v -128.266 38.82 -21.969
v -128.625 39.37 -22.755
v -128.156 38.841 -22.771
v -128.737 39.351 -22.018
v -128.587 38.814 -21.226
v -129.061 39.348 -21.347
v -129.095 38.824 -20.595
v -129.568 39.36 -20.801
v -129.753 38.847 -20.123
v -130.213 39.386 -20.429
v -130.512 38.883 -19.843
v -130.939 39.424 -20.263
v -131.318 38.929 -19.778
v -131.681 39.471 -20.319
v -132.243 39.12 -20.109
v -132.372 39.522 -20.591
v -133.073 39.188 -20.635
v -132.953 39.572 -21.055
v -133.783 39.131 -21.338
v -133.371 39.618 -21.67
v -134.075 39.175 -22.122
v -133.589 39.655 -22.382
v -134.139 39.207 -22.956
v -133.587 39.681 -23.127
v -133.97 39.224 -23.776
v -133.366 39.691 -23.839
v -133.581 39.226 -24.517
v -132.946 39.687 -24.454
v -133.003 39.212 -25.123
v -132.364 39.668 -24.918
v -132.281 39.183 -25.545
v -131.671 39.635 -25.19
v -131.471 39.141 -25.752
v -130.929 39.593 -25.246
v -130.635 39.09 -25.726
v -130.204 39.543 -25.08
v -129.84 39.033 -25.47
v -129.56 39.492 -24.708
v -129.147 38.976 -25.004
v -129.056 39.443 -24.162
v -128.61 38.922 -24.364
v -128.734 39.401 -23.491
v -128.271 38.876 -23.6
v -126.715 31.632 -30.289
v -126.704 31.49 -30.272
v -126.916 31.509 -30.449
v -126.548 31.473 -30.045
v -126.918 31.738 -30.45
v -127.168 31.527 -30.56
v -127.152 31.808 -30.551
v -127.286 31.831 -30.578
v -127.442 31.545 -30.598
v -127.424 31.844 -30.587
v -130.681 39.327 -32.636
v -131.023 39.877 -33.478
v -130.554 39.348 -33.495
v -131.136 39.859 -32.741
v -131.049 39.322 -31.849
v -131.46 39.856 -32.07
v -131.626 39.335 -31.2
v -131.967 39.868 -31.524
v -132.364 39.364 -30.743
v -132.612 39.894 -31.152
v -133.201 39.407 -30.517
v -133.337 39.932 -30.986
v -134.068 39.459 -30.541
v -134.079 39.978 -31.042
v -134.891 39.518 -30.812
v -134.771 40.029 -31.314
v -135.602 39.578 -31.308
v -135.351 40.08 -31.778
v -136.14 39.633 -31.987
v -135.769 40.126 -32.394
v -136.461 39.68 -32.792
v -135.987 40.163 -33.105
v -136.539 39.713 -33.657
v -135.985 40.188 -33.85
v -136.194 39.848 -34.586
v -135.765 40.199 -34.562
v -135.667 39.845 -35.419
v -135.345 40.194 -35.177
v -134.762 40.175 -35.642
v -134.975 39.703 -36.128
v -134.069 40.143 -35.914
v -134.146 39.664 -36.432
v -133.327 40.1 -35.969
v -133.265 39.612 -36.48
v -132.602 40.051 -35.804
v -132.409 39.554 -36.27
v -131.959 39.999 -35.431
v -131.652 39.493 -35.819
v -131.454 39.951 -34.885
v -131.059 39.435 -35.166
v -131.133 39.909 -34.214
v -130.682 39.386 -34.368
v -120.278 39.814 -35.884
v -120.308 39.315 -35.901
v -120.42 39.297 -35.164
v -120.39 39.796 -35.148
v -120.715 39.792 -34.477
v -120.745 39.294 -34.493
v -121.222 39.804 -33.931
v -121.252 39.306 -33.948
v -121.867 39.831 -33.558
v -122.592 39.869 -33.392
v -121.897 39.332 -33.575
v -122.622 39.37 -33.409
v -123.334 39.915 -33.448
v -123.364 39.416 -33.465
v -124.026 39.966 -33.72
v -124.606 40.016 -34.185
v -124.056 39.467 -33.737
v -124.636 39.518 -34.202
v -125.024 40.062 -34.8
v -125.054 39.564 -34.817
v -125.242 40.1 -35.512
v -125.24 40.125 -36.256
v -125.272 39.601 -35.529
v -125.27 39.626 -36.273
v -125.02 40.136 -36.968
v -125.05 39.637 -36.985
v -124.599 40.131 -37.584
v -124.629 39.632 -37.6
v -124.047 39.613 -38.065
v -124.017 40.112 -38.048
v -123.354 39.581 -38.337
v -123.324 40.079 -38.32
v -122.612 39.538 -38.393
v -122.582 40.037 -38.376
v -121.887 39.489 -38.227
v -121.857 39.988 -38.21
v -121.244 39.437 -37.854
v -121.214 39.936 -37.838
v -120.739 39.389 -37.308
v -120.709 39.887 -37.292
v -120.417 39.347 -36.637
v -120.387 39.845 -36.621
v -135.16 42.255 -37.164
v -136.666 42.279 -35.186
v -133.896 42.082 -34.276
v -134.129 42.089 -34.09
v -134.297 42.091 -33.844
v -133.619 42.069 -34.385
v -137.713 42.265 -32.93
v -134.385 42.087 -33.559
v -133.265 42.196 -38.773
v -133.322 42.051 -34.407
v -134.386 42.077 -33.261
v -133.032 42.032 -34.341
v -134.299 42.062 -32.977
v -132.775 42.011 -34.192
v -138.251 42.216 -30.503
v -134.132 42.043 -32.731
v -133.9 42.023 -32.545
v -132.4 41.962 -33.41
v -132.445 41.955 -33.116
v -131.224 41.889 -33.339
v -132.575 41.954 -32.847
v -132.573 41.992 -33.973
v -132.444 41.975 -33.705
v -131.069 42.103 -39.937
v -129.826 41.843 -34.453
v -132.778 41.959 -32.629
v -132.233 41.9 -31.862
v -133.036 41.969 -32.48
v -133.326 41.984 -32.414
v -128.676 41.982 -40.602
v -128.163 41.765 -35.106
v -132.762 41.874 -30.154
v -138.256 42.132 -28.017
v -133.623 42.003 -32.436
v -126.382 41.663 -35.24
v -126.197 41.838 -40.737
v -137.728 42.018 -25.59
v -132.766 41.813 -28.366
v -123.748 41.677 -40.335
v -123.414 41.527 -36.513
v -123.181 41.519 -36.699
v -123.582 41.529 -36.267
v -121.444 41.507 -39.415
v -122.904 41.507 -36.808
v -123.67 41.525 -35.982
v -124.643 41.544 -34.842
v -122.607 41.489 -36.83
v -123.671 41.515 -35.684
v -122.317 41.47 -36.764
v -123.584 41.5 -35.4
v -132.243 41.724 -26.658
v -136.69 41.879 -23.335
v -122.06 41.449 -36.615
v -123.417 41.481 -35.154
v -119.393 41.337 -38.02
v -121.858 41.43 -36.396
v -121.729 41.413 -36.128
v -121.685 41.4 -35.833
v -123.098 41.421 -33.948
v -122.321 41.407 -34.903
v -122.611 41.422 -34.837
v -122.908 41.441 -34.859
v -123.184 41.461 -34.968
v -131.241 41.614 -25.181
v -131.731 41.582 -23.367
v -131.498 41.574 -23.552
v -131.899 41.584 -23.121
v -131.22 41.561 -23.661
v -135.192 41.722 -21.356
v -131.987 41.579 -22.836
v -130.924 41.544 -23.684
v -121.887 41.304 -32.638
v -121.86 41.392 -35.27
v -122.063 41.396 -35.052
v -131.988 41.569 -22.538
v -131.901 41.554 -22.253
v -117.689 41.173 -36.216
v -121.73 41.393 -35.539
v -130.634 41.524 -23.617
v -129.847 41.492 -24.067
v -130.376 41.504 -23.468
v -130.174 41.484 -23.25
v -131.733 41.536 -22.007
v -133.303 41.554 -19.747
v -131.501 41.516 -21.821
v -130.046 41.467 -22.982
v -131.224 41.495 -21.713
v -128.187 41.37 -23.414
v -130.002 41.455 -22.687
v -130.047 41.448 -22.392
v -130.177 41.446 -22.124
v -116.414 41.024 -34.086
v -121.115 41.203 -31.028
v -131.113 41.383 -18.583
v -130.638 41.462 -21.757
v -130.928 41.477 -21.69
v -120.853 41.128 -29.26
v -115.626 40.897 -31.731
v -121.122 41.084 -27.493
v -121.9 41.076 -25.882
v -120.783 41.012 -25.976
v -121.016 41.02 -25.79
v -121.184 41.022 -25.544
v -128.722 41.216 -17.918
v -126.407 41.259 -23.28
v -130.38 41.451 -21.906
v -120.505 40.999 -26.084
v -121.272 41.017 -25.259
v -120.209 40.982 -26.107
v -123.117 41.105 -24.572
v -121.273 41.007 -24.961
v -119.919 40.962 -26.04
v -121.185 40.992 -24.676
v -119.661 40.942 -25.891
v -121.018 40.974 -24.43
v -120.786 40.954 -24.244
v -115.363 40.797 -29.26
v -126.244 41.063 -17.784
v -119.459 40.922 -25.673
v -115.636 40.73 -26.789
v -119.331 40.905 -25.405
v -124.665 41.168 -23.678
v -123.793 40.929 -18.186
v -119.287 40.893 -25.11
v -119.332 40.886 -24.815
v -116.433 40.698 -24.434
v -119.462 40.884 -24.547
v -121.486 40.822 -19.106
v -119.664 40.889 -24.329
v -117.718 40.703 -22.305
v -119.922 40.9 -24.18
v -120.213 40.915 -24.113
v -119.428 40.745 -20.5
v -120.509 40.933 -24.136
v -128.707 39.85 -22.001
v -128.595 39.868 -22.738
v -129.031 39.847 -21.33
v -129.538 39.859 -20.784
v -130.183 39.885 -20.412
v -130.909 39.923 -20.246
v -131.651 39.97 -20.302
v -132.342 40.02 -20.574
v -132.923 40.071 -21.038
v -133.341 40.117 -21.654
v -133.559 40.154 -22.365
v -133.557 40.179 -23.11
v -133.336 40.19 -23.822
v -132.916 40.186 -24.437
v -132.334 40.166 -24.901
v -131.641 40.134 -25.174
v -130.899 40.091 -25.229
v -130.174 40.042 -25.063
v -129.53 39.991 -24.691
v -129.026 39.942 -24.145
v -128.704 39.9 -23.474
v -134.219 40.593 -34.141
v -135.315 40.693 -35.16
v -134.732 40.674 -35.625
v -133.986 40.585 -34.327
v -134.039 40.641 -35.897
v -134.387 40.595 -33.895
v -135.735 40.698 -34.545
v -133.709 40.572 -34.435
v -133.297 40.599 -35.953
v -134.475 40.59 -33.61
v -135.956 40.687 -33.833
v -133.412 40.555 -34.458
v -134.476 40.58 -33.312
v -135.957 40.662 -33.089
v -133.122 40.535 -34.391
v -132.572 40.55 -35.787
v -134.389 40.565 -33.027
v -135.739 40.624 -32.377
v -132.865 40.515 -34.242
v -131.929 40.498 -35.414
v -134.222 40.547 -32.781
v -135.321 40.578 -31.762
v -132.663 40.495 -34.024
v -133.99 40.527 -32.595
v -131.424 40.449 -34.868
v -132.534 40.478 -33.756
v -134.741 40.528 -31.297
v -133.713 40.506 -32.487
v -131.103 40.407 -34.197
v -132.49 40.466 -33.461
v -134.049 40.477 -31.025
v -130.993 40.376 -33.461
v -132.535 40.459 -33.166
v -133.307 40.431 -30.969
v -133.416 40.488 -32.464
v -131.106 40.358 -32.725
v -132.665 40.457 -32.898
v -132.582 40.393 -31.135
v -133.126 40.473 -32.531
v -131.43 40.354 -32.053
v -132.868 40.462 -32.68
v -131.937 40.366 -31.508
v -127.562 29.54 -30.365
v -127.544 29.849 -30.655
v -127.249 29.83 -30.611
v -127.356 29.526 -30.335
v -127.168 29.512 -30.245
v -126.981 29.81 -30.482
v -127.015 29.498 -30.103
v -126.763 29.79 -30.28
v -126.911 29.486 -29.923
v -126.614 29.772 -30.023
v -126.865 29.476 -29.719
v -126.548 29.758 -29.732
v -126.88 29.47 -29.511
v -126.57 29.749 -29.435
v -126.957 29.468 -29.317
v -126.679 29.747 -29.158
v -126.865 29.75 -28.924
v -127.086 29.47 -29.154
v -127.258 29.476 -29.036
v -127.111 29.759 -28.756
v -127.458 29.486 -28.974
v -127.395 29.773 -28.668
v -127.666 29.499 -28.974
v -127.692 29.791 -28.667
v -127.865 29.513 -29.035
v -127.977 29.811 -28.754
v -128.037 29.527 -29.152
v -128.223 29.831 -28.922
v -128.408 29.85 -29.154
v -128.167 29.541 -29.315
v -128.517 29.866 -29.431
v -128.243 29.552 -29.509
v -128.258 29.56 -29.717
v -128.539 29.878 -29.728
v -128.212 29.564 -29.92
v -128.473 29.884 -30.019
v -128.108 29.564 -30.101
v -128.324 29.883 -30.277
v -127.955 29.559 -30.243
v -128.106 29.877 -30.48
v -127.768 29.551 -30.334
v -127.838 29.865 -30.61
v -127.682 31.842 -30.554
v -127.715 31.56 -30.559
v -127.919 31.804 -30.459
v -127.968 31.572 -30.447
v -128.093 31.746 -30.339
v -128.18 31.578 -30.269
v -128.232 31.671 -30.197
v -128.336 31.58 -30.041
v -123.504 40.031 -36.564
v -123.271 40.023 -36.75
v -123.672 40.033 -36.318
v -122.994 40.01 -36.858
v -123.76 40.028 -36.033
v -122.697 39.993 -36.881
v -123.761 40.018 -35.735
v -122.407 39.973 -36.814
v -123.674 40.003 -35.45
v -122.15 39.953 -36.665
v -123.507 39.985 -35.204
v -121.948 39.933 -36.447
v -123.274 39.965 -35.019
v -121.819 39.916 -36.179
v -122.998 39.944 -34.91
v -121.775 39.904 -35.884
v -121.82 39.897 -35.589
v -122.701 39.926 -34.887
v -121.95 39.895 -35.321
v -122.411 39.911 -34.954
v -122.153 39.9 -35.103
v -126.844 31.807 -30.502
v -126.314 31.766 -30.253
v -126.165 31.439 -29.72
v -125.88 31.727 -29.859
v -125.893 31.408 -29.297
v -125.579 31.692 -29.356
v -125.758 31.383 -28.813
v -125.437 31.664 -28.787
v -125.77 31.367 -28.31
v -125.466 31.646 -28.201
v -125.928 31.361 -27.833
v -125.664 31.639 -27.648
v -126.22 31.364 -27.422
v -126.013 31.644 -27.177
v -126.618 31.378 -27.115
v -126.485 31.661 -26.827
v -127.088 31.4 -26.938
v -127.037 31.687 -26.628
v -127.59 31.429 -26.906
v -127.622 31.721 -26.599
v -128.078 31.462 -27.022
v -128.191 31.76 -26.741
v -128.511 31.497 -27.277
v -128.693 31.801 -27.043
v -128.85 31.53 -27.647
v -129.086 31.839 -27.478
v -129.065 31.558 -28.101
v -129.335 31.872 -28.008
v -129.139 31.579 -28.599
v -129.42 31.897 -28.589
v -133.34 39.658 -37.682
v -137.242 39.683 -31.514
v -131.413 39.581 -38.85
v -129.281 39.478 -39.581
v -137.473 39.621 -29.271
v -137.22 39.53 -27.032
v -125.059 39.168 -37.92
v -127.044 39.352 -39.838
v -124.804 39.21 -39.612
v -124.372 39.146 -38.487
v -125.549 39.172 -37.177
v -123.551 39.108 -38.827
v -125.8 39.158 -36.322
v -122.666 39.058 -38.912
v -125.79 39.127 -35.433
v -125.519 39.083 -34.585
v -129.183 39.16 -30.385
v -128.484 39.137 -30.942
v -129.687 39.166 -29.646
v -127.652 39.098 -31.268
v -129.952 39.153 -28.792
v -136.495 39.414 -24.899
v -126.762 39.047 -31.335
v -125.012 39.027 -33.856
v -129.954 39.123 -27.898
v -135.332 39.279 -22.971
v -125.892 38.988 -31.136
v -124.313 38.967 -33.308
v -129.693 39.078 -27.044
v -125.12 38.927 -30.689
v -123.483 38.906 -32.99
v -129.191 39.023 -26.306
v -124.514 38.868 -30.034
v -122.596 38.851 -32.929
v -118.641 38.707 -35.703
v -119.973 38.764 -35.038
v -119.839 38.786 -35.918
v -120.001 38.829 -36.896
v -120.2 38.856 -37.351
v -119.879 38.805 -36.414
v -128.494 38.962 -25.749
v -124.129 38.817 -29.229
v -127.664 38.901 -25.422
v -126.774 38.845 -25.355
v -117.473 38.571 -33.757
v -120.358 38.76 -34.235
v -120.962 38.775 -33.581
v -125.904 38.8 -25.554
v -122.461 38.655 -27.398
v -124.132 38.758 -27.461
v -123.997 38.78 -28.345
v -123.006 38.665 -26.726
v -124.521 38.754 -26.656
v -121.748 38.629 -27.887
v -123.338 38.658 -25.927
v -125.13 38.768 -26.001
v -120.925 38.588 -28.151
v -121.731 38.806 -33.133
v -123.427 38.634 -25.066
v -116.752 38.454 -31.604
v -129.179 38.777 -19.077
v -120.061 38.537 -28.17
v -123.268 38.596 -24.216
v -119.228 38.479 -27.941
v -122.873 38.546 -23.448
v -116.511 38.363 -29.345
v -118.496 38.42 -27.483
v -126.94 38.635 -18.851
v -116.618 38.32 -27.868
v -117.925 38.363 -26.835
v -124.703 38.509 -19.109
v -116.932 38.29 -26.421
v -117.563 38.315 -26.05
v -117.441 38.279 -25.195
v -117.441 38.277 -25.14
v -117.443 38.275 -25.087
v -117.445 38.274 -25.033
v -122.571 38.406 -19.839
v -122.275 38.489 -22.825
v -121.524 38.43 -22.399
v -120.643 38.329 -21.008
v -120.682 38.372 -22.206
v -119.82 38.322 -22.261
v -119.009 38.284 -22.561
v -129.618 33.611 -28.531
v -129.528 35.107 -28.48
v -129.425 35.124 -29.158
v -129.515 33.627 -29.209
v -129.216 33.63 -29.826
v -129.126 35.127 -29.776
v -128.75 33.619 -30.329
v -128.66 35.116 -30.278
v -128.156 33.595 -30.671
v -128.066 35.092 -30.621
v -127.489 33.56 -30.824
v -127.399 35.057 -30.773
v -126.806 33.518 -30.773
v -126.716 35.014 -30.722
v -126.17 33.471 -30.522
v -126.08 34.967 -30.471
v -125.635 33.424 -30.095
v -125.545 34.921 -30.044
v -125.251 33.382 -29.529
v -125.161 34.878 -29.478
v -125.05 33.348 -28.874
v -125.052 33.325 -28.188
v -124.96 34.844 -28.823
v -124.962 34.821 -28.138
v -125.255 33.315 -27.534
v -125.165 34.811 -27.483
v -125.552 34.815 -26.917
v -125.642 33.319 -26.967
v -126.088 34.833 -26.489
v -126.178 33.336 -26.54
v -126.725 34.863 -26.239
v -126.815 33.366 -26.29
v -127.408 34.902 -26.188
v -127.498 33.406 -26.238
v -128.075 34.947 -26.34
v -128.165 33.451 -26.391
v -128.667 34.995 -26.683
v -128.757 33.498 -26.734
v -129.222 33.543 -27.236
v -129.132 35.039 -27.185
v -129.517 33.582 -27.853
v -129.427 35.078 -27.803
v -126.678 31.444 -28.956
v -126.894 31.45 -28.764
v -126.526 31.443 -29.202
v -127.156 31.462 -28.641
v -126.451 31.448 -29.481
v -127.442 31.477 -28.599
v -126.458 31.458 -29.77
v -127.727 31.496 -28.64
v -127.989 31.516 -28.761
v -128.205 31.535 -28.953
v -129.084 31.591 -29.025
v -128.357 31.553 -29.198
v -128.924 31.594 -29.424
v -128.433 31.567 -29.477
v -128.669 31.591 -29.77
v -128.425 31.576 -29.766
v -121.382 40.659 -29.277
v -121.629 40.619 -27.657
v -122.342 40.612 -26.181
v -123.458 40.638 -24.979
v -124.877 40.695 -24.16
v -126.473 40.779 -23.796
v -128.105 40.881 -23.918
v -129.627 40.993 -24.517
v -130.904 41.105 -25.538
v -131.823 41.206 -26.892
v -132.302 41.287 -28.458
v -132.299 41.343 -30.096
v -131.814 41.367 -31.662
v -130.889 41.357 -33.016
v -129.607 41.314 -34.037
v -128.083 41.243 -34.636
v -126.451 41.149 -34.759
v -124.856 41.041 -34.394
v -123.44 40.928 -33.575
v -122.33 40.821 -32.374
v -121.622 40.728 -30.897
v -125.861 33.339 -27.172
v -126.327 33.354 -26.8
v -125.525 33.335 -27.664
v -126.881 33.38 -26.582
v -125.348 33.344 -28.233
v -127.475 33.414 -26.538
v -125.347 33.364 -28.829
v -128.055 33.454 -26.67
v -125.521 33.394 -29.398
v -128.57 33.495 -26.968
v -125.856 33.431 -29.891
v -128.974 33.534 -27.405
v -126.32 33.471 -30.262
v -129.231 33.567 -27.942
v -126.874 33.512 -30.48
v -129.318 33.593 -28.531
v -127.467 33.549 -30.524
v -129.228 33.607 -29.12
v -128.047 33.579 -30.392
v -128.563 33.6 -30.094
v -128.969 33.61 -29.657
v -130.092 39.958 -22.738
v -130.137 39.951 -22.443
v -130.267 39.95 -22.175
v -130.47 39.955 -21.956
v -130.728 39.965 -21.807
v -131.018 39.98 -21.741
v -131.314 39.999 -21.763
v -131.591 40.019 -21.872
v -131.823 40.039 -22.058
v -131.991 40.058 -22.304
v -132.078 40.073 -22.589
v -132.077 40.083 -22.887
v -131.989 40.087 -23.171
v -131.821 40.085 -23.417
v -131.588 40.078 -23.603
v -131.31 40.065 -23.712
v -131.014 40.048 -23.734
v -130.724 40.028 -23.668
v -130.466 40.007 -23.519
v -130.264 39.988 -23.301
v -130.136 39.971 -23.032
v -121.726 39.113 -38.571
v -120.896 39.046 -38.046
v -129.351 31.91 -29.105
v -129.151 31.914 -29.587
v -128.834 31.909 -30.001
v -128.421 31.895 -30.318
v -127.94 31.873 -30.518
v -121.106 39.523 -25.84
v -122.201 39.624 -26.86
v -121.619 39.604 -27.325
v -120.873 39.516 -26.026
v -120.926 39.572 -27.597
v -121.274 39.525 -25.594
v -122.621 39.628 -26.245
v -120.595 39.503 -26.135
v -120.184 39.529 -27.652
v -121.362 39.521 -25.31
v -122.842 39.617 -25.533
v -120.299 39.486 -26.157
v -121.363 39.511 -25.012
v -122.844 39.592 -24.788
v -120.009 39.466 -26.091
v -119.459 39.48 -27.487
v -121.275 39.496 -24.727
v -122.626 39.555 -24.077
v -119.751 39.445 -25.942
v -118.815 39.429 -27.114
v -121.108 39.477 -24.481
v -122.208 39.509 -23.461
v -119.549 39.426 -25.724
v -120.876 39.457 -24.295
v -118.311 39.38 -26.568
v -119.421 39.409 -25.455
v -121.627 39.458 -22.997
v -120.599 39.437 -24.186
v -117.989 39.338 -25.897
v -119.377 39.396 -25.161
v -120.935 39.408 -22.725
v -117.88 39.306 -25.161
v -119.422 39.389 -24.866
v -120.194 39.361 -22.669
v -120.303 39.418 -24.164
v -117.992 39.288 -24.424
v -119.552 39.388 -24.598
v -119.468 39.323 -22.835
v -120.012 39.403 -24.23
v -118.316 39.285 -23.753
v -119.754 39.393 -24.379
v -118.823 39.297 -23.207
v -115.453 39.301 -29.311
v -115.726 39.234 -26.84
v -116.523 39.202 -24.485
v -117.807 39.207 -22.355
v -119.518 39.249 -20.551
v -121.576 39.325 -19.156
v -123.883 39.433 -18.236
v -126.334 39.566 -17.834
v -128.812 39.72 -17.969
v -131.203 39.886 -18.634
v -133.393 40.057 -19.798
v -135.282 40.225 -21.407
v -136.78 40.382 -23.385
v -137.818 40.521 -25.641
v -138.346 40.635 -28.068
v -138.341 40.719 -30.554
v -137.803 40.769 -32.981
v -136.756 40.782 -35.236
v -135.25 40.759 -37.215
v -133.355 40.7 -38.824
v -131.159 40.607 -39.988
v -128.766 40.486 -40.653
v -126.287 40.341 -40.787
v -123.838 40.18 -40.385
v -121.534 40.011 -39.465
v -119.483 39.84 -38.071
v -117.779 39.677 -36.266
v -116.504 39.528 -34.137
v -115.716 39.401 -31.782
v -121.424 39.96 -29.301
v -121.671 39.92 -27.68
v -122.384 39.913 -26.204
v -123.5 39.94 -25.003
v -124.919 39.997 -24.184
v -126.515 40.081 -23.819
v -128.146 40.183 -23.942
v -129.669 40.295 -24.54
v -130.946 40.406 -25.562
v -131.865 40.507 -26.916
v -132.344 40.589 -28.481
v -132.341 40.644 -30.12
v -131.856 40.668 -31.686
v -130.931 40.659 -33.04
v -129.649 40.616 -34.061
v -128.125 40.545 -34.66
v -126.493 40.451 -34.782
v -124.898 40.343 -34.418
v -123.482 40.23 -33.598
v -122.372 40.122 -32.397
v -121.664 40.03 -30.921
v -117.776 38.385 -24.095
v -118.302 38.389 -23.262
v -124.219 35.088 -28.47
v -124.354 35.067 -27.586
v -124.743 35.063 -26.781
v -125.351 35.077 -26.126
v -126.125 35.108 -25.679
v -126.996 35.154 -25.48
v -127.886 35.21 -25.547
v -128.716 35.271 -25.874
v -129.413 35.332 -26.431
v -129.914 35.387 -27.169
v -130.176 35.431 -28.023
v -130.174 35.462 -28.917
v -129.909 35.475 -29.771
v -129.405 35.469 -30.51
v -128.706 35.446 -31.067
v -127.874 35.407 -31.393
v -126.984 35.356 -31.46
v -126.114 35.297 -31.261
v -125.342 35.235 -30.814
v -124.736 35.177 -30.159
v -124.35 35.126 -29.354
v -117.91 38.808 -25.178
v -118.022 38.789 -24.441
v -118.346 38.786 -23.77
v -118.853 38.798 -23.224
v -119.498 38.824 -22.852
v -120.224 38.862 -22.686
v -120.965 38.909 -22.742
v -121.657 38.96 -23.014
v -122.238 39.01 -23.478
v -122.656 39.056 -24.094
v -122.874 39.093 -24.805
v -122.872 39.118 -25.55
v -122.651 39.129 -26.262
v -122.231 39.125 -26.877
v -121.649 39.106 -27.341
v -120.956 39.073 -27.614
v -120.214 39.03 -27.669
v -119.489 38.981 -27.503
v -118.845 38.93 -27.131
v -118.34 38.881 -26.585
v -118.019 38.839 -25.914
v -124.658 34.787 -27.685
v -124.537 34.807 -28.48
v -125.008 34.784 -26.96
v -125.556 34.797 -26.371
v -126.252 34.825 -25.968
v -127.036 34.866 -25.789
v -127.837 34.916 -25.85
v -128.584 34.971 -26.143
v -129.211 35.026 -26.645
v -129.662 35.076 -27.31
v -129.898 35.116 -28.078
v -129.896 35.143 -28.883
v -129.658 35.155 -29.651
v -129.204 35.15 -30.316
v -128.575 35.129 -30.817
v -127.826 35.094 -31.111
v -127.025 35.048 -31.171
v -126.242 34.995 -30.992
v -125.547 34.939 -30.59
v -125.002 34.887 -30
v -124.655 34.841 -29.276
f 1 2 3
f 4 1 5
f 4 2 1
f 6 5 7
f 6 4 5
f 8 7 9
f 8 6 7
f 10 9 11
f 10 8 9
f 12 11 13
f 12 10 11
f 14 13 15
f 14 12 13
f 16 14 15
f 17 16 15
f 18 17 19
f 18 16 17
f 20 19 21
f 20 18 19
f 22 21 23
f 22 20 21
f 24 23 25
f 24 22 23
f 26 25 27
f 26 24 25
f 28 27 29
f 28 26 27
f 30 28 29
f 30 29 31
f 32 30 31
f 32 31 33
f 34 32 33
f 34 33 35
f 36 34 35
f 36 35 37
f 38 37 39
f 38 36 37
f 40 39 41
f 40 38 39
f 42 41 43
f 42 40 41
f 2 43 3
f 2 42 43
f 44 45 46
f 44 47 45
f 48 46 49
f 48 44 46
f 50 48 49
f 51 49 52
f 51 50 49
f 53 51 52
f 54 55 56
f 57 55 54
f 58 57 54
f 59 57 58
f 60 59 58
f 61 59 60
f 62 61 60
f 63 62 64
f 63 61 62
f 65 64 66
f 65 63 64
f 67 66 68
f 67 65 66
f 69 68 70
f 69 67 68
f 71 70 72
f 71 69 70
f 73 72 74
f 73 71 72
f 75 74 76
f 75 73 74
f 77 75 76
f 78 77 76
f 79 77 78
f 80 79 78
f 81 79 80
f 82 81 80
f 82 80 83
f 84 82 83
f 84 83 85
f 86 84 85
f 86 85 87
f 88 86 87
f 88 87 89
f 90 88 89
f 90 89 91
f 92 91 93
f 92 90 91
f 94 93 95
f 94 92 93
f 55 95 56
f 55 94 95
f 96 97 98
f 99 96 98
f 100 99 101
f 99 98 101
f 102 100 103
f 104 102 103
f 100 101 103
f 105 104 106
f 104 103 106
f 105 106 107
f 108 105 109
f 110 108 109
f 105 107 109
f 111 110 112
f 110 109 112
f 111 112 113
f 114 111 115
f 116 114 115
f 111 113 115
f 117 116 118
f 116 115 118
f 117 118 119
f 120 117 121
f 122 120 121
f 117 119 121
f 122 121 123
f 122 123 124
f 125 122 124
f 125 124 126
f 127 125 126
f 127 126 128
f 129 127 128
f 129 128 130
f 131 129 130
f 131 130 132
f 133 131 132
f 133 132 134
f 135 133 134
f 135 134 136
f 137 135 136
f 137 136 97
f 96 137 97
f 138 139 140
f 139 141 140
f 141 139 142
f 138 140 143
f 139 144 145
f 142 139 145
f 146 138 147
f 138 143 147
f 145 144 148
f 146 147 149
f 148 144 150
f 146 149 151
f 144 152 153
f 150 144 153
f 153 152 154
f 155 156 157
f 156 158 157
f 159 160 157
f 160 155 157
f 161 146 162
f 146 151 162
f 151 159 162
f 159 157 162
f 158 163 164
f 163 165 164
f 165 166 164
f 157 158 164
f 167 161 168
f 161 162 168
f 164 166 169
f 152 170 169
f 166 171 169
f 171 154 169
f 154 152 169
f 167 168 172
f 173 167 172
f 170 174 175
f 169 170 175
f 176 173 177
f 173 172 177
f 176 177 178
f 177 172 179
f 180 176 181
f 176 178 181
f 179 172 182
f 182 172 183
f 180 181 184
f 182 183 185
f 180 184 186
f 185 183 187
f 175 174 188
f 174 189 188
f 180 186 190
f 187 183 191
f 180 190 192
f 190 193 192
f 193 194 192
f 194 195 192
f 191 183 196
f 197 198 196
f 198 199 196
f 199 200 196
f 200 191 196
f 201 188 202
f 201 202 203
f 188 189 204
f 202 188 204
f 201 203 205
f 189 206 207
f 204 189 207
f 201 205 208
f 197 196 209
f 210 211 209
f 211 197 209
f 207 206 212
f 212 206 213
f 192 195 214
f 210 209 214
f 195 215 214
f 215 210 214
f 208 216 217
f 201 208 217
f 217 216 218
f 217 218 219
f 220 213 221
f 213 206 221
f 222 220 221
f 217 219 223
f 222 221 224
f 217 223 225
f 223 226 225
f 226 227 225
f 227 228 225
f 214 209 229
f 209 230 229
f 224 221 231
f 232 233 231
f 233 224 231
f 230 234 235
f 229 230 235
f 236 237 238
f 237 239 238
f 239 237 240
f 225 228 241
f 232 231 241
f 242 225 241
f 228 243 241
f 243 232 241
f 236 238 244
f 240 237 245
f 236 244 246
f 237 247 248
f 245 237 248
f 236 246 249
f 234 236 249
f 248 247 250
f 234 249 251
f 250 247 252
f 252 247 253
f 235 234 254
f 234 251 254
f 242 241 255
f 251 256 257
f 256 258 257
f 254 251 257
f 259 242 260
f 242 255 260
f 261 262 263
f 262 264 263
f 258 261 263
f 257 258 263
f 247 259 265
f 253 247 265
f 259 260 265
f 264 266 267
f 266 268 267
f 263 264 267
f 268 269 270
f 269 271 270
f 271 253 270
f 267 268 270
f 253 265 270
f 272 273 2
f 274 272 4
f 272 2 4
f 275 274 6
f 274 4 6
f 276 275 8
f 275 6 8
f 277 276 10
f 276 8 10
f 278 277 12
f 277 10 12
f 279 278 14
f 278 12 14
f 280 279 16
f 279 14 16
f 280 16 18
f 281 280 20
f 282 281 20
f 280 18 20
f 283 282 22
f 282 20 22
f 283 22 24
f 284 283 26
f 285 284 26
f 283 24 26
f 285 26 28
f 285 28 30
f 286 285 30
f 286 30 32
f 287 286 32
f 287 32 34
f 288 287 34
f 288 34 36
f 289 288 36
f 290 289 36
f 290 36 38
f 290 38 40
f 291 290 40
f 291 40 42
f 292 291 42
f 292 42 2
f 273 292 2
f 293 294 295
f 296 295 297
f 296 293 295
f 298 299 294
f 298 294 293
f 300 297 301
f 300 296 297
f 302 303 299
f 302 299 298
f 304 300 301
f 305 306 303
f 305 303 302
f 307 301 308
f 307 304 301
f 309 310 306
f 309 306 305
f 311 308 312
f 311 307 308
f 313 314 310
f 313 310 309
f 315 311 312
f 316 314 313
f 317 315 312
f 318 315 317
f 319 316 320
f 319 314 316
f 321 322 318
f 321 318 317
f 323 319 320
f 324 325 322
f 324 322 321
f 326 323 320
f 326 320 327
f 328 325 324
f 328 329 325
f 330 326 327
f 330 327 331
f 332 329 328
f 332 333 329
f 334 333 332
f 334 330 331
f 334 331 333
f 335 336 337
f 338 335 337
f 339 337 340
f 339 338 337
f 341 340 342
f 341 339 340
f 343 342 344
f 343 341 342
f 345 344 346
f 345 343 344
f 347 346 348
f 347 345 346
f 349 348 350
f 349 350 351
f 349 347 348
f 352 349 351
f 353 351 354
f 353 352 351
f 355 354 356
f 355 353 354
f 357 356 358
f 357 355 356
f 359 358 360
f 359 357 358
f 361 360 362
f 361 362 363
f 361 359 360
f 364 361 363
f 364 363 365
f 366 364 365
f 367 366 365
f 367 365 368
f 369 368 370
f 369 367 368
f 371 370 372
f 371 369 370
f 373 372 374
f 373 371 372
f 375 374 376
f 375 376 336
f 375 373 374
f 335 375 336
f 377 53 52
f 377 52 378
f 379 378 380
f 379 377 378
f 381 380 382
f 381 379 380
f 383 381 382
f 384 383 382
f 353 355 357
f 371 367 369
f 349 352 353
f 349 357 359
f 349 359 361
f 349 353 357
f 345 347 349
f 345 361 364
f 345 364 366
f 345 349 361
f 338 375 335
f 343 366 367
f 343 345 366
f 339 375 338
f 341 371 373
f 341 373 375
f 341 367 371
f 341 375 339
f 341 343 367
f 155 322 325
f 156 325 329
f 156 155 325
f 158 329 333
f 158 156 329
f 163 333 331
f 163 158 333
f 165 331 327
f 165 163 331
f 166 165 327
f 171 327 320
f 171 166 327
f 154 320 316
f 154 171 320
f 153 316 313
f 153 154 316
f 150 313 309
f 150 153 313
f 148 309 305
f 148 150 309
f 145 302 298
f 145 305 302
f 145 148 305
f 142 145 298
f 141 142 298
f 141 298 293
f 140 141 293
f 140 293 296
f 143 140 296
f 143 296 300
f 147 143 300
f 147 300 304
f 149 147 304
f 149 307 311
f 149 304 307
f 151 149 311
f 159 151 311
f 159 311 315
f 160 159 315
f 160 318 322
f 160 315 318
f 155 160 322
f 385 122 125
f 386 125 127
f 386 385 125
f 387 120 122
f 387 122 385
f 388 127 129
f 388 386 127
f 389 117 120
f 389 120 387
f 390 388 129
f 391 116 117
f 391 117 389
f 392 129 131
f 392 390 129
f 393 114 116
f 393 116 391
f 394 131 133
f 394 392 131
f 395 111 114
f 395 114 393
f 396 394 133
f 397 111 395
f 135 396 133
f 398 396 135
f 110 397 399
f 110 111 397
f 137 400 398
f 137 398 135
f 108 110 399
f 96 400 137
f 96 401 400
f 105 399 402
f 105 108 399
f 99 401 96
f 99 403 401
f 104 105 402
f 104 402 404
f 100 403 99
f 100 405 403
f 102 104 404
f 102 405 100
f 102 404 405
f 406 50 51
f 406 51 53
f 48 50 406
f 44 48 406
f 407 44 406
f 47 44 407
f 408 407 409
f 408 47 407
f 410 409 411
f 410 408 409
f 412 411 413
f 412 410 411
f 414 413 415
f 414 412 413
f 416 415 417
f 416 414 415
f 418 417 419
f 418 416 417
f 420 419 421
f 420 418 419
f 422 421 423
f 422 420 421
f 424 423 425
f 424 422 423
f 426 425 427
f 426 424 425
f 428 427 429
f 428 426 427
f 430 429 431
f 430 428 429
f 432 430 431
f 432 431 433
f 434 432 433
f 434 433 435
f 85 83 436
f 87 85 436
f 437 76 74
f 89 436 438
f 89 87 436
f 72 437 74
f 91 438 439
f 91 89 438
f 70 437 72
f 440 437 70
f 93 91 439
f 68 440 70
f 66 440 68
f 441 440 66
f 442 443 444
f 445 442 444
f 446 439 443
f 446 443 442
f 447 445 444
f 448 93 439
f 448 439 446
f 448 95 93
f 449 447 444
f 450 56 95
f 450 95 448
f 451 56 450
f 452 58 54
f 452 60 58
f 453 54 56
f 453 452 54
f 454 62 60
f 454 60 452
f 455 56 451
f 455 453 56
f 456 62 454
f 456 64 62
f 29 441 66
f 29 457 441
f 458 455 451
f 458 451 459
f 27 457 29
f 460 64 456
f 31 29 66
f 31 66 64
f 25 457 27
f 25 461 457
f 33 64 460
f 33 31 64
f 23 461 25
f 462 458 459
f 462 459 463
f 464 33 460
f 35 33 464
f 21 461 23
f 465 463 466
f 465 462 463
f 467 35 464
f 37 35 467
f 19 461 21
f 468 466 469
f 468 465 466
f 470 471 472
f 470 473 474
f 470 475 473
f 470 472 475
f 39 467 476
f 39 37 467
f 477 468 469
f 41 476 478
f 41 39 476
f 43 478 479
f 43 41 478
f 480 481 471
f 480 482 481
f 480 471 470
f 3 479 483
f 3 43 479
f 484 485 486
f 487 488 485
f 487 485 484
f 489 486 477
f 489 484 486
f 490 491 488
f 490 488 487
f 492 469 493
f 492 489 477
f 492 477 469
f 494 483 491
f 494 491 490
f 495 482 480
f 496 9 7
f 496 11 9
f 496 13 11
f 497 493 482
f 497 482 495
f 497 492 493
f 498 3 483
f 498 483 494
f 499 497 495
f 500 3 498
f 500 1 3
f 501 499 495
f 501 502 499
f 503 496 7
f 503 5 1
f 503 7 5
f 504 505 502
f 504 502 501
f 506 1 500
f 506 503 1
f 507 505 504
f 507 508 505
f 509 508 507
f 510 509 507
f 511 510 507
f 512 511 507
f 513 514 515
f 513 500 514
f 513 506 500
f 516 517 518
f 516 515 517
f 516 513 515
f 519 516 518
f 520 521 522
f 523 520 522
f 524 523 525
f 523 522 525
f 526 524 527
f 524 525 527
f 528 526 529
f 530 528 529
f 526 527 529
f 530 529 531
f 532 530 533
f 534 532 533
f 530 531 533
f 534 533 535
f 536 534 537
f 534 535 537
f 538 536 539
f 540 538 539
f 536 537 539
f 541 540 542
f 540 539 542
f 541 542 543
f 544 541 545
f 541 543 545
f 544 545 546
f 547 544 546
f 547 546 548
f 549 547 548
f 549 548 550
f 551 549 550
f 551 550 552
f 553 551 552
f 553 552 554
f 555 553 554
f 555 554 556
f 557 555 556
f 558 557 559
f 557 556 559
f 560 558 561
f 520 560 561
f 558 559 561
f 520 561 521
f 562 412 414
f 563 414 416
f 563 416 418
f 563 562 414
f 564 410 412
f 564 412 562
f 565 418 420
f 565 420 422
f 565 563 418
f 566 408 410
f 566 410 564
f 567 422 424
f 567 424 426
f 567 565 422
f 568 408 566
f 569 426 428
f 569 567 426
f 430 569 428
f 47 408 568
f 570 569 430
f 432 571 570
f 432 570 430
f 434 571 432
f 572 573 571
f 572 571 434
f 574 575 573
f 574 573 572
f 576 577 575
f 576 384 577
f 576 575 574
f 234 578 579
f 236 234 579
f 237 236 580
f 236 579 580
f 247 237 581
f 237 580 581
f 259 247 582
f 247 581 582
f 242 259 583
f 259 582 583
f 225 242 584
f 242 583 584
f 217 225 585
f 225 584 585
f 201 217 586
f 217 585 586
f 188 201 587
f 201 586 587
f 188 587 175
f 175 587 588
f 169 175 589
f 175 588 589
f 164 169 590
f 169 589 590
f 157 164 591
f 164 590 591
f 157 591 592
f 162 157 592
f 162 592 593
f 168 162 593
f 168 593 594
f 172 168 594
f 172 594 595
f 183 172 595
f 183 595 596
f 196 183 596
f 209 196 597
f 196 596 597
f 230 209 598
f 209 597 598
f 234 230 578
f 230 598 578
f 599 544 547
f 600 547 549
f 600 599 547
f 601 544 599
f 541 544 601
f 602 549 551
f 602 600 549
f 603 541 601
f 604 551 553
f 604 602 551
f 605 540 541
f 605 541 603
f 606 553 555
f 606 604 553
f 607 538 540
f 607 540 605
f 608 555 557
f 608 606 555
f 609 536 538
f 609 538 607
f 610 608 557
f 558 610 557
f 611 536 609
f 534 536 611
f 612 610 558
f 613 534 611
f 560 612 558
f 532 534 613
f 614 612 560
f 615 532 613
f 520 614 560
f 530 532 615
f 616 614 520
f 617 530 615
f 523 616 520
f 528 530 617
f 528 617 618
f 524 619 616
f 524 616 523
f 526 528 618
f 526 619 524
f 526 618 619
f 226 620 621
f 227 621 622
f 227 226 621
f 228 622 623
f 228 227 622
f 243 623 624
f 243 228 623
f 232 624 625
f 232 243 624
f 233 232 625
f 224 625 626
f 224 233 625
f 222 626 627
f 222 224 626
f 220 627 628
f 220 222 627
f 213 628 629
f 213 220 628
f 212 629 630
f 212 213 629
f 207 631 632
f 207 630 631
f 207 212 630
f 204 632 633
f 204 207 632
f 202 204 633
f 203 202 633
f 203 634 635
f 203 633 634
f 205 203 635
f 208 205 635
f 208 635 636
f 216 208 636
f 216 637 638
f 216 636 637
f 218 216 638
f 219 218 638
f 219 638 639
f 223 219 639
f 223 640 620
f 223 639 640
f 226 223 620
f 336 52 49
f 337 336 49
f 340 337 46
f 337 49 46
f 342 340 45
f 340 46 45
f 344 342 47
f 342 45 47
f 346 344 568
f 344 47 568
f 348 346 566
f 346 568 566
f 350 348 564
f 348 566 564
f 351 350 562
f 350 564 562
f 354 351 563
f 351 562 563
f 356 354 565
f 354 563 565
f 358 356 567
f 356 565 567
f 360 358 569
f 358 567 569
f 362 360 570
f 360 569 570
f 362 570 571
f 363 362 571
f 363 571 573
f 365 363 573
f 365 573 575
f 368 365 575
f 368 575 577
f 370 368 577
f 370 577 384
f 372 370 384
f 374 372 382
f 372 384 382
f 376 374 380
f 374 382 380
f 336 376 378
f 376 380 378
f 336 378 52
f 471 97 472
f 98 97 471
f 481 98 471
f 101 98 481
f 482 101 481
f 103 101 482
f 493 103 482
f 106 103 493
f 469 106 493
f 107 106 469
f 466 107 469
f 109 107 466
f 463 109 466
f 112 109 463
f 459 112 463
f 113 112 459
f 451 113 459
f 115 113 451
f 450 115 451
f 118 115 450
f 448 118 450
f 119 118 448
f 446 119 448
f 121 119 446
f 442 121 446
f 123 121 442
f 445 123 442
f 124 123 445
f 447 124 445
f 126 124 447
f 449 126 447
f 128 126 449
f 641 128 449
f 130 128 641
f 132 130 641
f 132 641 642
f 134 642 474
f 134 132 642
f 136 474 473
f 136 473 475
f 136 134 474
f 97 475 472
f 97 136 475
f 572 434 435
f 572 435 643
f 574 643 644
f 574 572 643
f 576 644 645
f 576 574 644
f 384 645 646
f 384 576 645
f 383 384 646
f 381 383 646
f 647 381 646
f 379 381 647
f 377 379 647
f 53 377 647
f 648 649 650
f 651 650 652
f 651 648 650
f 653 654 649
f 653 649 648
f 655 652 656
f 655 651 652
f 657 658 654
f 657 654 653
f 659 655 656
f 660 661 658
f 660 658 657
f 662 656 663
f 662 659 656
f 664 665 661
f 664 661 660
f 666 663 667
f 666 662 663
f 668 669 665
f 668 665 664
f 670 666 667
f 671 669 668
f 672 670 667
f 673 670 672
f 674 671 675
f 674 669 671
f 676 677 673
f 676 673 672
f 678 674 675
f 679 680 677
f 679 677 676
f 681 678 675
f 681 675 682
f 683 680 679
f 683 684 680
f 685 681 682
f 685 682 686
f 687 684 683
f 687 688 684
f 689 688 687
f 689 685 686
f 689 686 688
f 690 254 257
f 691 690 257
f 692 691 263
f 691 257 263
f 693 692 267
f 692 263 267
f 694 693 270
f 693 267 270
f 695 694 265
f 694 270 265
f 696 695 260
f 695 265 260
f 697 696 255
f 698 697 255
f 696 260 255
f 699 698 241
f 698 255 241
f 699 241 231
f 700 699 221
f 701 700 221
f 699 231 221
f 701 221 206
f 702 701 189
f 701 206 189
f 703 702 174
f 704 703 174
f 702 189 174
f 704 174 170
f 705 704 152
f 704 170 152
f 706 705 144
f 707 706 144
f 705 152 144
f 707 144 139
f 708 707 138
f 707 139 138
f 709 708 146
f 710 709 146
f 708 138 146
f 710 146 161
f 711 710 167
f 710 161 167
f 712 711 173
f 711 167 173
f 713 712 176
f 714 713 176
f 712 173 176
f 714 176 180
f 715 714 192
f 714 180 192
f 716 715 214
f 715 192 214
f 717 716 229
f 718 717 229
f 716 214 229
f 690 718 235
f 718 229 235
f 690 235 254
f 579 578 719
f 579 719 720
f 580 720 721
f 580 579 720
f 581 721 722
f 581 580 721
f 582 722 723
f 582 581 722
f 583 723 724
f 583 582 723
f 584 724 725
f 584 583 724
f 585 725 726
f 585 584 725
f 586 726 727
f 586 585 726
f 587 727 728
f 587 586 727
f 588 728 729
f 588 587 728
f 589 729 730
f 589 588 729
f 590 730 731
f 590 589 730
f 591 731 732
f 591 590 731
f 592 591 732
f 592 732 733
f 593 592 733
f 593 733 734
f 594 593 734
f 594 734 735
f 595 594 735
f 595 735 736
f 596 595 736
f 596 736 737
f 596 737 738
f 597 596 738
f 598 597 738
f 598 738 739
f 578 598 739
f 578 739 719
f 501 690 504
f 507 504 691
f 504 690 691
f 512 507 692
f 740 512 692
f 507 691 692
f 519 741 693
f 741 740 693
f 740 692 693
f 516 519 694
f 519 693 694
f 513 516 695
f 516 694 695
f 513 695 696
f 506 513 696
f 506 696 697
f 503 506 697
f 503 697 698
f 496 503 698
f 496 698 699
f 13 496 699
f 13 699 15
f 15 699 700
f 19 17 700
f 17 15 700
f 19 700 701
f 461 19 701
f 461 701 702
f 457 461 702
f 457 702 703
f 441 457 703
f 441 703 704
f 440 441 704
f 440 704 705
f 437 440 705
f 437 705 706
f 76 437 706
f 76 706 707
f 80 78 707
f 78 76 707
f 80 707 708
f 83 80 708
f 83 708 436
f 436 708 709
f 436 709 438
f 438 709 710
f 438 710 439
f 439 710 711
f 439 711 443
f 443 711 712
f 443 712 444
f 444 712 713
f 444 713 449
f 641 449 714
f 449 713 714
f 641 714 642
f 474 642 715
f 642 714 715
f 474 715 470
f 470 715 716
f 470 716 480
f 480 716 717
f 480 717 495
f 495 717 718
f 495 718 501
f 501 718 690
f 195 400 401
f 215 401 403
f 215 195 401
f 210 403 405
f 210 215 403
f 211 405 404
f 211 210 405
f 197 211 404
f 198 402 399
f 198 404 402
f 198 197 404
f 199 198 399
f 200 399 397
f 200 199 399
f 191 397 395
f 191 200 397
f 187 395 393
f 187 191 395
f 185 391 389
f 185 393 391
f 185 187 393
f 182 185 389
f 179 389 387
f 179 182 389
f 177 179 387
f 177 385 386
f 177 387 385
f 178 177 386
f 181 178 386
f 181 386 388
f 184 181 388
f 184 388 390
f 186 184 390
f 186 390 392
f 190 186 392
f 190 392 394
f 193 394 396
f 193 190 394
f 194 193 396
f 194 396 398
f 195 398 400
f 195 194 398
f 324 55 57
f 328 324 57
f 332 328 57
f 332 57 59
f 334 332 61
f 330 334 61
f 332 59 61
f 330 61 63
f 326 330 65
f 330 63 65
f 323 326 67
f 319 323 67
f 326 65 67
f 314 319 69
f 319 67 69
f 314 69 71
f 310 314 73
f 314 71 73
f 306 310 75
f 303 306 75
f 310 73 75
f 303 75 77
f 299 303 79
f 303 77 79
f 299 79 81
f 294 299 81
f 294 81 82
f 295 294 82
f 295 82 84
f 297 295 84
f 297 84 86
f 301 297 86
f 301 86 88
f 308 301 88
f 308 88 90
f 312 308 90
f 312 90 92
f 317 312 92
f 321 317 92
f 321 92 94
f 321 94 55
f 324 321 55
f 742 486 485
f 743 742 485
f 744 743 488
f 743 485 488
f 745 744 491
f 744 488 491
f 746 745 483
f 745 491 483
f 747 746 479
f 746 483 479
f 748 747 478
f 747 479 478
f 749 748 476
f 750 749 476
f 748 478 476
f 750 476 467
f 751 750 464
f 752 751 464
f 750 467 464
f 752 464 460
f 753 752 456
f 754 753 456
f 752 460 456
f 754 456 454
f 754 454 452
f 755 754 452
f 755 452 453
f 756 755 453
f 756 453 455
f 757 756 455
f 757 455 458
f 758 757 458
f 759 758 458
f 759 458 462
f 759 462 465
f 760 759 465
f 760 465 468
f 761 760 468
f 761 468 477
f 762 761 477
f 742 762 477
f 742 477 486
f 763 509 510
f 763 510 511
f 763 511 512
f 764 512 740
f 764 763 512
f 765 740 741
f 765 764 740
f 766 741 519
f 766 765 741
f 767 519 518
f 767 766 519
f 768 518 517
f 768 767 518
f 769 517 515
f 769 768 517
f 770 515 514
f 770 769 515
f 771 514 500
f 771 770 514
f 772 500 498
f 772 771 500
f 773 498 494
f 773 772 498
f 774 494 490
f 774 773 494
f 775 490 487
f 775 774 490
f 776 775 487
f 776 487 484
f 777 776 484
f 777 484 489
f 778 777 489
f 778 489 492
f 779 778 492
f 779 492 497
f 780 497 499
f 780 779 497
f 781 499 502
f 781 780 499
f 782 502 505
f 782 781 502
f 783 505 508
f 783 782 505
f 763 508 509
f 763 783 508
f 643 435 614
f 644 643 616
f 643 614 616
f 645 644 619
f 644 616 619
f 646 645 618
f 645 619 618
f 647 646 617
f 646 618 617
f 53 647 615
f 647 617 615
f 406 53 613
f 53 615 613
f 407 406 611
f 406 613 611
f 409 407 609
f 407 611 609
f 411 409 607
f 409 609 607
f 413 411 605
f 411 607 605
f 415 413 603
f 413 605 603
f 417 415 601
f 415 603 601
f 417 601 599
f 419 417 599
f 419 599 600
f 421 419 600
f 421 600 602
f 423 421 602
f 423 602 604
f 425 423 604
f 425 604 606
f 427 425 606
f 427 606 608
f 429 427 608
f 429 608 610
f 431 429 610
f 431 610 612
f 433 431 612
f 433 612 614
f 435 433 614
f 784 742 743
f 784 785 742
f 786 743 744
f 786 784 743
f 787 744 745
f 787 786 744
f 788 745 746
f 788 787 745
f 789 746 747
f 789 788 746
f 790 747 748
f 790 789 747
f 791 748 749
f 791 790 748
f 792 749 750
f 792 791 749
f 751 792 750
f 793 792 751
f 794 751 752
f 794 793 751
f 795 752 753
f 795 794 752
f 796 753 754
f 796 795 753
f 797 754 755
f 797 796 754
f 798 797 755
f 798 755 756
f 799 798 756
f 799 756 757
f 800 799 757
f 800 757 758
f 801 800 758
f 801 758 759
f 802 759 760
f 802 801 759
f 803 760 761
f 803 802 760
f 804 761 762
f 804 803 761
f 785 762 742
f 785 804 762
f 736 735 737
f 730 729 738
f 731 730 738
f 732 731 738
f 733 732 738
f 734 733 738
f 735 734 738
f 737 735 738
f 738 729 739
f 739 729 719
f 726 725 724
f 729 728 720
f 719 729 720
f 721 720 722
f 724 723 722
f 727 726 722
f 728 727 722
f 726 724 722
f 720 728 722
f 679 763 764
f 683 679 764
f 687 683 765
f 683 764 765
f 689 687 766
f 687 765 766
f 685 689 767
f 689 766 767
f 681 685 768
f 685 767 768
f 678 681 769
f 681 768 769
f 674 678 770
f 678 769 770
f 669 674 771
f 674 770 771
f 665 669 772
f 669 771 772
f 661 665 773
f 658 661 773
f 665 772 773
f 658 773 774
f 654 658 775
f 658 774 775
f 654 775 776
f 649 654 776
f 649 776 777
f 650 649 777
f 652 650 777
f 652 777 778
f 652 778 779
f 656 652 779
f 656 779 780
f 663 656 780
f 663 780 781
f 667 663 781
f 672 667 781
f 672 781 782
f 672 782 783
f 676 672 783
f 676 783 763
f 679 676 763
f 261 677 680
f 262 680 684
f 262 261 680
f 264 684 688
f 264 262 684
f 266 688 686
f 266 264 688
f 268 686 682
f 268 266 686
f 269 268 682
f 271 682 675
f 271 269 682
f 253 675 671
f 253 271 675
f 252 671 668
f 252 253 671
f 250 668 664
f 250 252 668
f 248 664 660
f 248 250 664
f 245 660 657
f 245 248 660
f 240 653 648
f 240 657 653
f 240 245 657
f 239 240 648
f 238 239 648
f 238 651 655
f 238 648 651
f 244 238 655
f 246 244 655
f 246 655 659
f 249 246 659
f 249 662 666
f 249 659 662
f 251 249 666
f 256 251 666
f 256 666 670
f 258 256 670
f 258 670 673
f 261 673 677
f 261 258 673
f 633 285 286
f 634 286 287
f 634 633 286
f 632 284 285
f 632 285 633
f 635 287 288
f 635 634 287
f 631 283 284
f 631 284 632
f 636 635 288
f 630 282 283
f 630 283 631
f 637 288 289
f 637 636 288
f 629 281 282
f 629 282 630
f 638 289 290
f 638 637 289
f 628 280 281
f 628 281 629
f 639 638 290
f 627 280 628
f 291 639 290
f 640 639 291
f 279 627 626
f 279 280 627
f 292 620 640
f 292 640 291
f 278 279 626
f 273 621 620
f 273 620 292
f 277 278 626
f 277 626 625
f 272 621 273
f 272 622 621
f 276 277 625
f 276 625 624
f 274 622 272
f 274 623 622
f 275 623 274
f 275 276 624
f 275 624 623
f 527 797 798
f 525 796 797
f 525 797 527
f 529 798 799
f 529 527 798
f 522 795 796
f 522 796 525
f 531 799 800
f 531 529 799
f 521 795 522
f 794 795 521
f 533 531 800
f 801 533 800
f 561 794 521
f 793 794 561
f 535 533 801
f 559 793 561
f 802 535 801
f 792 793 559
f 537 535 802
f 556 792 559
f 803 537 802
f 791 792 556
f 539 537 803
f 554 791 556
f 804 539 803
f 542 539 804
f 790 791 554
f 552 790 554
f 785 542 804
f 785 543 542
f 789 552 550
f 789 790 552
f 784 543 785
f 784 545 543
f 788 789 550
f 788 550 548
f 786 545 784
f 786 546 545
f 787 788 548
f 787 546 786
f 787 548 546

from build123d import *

# Parameters (mm, degrees)
SKETCH_1_R          = 11.5
SKETCH_1_R_2        = 5.5
SKETCH_1_R_3        = 1
EXTRUDE_1_DEPTH     = 2.5
EXTRUDE_START       = -1.3
SKETCH_2_R          = 5.5
EXTRUDE_2_DEPTH     = 1.3
SKETCH_5_R          = 2.5
CUT_EXTRUDE_1_DEPTH = 1
SKETCH_6_R          = 2
EXTRUDE_3_DEPTH     = 7.5
SKETCH_7_R          = 3
EXTRUDE_4_DEPTH     = 4
SKETCH_10_R         = 1
EXTRUDE_5_DEPTH     = 2
CHAMFER_1_SIZE      = 0.3
SKETCH_11_R         = 2.300425052
EXTRUDE_6_DEPTH     = 1.5
CHAMFER_2_SIZE      = 1
CHAMFER_3_SIZE      = 0.5
CHAMFER_4_SIZE      = 0.5


with BuildPart() as part:
    # 草图1 → 凸台-拉伸1 (new body)
    with BuildSketch(Plane(origin=(1.966710395, 32.715392416, 1.10826425), x_dir=(0.9981999912017503, -0.059938758009620605, -0.002030480999629514), z_dir=(-0.05997314036154614, -0.9976277272985652, -0.03379556421002548))):
        with Locations(Location((-129.040965006, -30.648001563, 0), (0, 0, 0.116404566))):
            Circle(SKETCH_1_R)
        with Locations(Location((-129.040965006, -30.648001563, 0), (0, 0, 0.116404566))):
            Circle(SKETCH_1_R_2, mode=Mode.SUBTRACT)
        with Locations(Location((-135.609495823, -34.813863168, 0), (0, 0, 0.116404566))):
            Circle(SKETCH_1_R_3, mode=Mode.SUBTRACT)
        with Locations(Location((-133.206826611, -24.079470746, 0), (0, 0, 0.116404566))):
            Circle(SKETCH_1_R_3, mode=Mode.SUBTRACT)
        with Locations(Location((-122.472434189, -26.482139959, 0), (0, 0, 0.116404566))):
            Circle(SKETCH_1_R_3, mode=Mode.SUBTRACT)
        with Locations(Location((-124.875103402, -37.21653238, 0), (0, 0, 0.116404566))):
            Circle(SKETCH_1_R_3, mode=Mode.SUBTRACT)
    extrude(amount=EXTRUDE_1_DEPTH)

    # 草图2 → 凸台-拉伸2 (add)
    with BuildSketch(Plane(origin=(1.816777544, 30.221323097, 1.02377534), x_dir=(0.9981999912017503, -0.059938758009620605, -0.002030480999629515), z_dir=(-0.05997314036154614, -0.9976277272985652, -0.03379556421002549)).offset(EXTRUDE_START)):
        with Locations(Location((-129.040965006, -30.648001563, 0), (0, 0, 0.116404566))):
            Circle(SKETCH_2_R)
    extrude(amount=EXTRUDE_2_DEPTH)

    # 草图5 → 切除-拉伸1 (cut)
    with BuildSketch(Plane(origin=(1.816777544, 30.221323097, 1.02377534), x_dir=(0.9981999912017503, -0.059938758009620605, -0.002030480999629515), z_dir=(-0.05997314036154614, -0.9976277272985652, -0.03379556421002564))):
        with Locations(Location((-135.609495823, -34.813863168, 0), (0, 0, 0.116404566))):
            Circle(SKETCH_5_R)
        with Locations(Location((-133.206826611, -24.079470746, 0), (0, 0, 0.116404566))):
            Circle(SKETCH_5_R)
        with Locations(Location((-122.472434189, -26.482139959, 0), (0, 0, 0.116404566))):
            Circle(SKETCH_5_R)
        with Locations(Location((-124.875103402, -37.21653238, 0), (0, 0, 0.116404566))):
            Circle(SKETCH_5_R)
    extrude(amount=-CUT_EXTRUDE_1_DEPTH, mode=Mode.SUBTRACT)

    # 草图6 → 凸台-拉伸3 (add)
    with BuildSketch(Plane(origin=(1.816777544, 30.221323097, 1.02377534), x_dir=(0.9981999912017503, -0.059938758009620605, -0.002030480999629515), z_dir=(-0.05997314036154614, -0.9976277272985652, -0.033795564210025573))):
        with Locations(Location((-129.040965006, -29.648001563, 0), (0, 0, 180.116404566))):
            Circle(SKETCH_6_R)
    extrude(amount=EXTRUDE_3_DEPTH)

    # 草图7 → 凸台-拉伸4 (add)
    with BuildSketch(Plane(origin=(1.816777544, 30.221323097, 1.02377534), x_dir=(0.9981999912017503, -0.059938758009620605, -0.002030480999629515), z_dir=(-0.05997314036154614, -0.9976277272985652, -0.033795564210025615))):
        with Locations(Location((-129.040965006, -29.648001563, 0), (0, 0, 0.116404566))):
            Circle(SKETCH_7_R)
    extrude(amount=EXTRUDE_4_DEPTH)

    # 草图10 → 凸台-拉伸5 (add)
    with BuildSketch(Plane(origin=(1.366978991, 22.739115143, 0.770308608), x_dir=(0.9981999912017503, -0.05993875800962059, -0.002030480999629514), z_dir=(-0.05997314036154613, -0.9976277272985652, -0.03379556421002559))):
        with Locations(Location((-129.040965006, -30.648001563, 0), (0, 0, 269.999999999))):
            Circle(SKETCH_10_R)
    extrude(amount=EXTRUDE_5_DEPTH)

    # 倒角1
    # the kernel refuses this chamfer: 0.3 mm, written as the material it takes off along each edge
    with BuildSketch(Plane(origin=(-127.441711143, 31.477448067, -28.598680652), x_dir=(-1.5916157281026276e-11, 0.0338565062200545, -0.9994267041592252), z_dir=(-0.9981999912017503, 0.059938758009080766, 0.002030481015565288))) as chamfer_1_piece_1_section:
        Polygon((2, -CHAMFER_1_SIZE), (2 - CHAMFER_1_SIZE, 0), (2, 0), align=None)
    chamfer_1_piece_1 = revolve(axis=Axis((-127.441711143, 31.477448067, -28.598680652), (-0.05997314036154614, -0.9976277272985652, -0.03379556421002558)), revolution_arc=270.116404567, mode=Mode.PRIVATE)
    chamfer_1_piece_1 = chamfer_1_piece_1 - Plane(origin=(-127.43302189, 31.655846599, -29.593210861), x_dir=(-1.742146691663825e-11, 0.03385650622014407, -0.9994267041592222), z_dir=(0.05997314036154613, 0.9976277272985653, 0.033795564210025594)) * Cylinder(1, 8, mode=Mode.PRIVATE)
    add(chamfer_1_piece_1, mode=Mode.SUBTRACT)
    with BuildSketch(Plane(origin=(-127.231805152, 34.969145112, -28.480396177), x_dir=(0.9981979311307728, -0.060007418593410425, 2.631376598098256e-12), z_dir=(0.0020279845707766217, 0.033734662275686965, -0.9994287667661592))) as chamfer_1_piece_2:
        Polygon((3, -CHAMFER_1_SIZE), (3 - CHAMFER_1_SIZE, 0), (3, 0), align=None)
    revolve(axis=Axis((-127.231805152, 34.969145112, -28.480396177), (-0.05997314036154614, -0.9976277272985652, -0.03379556421002563)), mode=Mode.SUBTRACT)
    with BuildSketch(Plane(origin=(-127.561657424, 29.516049118, -29.665698484), x_dir=(-1.7422507880890286e-11, 0.03385650622014249, -0.9994267041592222), z_dir=(-0.9981999912017504, 0.05993875800902966, 0.0020304810170733417))) as chamfer_1_piece_3:
        Polygon((1, -CHAMFER_1_SIZE), (1 - CHAMFER_1_SIZE, 0), (1, 0), align=None)
    revolve(axis=Axis((-127.561657424, 29.516049118, -29.665698484), (-0.05997314036154613, -0.9976277272985653, -0.033795564210025594)), mode=Mode.SUBTRACT)
    with BuildSketch(Plane(origin=(-127.441711143, 31.477448067, -28.598680652), x_dir=(-0.9981979311307727, 0.060007418593412805, -2.629008122312364e-12), z_dir=(-0.0020279845707743367, -0.03373466227568705, 0.9994287667661592))) as chamfer_1_piece_4_section:
        Polygon((2, -CHAMFER_1_SIZE), (2 - CHAMFER_1_SIZE, 0), (2, 0), align=None)
    chamfer_1_piece_4 = revolve(axis=Axis((-127.441711143, 31.477448067, -28.598680652), (-0.05997314036154614, -0.9976277272985652, -0.03379556421002558)), revolution_arc=89.883595433, mode=Mode.PRIVATE)
    chamfer_1_piece_4 = chamfer_1_piece_4 - Plane(origin=(-127.432917992, 31.657574909, -29.593152313), x_dir=(-1.742146691663825e-11, 0.03385650622014407, -0.9994267041592222), z_dir=(0.05997314036154613, 0.9976277272985653, 0.033795564210025594)) * Cylinder(1, 9, mode=Mode.PRIVATE)
    add(chamfer_1_piece_4, mode=Mode.SUBTRACT)

    # 草图11 → 凸台-拉伸6 (add)
    with BuildSketch(Plane(origin=(1.576884982, 26.230812188, 0.888593083), x_dir=(0.9981999912017503, -0.059938758009620605, -0.0020304809996295197), z_dir=(-0.05997314036154614, -0.9976277272985652, -0.03379556421002562))):
        with Locations(Location((-129.040965006, -29.648001563, 0), (0, 0, 180.116404566))):
            Circle(SKETCH_11_R)
    extrude(amount=EXTRUDE_6_DEPTH)

    # 倒角2
    chamfer_2_edges = [part.edges().sort_by_distance(p)[0] for p in [
        (-138.471188798, 39.683597842, -29.344640624),
    ]]
    chamfer(chamfer_2_edges, length=CHAMFER_2_SIZE)

    # 倒角3
    # the kernel refuses this chamfer: 0.5 mm, written as the material it takes off along each edge
    with BuildSketch(Plane(origin=(-122.833549573, 38.966203462, -35.917864433), x_dir=(0.9981979311307727, -0.06000741859341191, 2.6318502932554117e-12), z_dir=(0.0020279845707771465, 0.03373466227568696, -0.9994287667661592))) as chamfer_3_piece_1:
        Polygon((2.5 + CHAMFER_3_SIZE, 0), (2.5, -CHAMFER_3_SIZE), (2.5, 0), align=None)
    revolve(axis=Axis((-122.833549573, 38.966203462, -35.917864433), (-0.05997314036154614, -0.9976277272985652, -0.03379556421002566)), mode=Mode.SUBTRACT)
    with BuildSketch(Plane(origin=(-120.435205187, 38.458761429, -25.194504568), x_dir=(0.9981979311307725, -0.06000741859341508, 2.6304292077839058e-12), z_dir=(0.002027984570775836, 0.033734662275687034, -0.9994287667661591))) as chamfer_3_piece_2:
        Polygon((2.5 + CHAMFER_3_SIZE, 0), (2.5, -CHAMFER_3_SIZE), (2.5, 0), align=None)
    revolve(axis=Axis((-120.435205187, 38.458761429, -25.194504568), (-0.05997314036154614, -0.9976277272985652, -0.03379556421002566)), mode=Mode.SUBTRACT)
    with BuildSketch(Plane(origin=(-131.150275607, 39.020821594, -22.771416816), x_dir=(0.9981979311307727, -0.06000741859341225, 2.633271378726947e-12), z_dir=(0.0020279845707785755, 0.033734662275686875, -0.9994287667661592))) as chamfer_3_piece_3:
        Polygon((2.5 + CHAMFER_3_SIZE, 0), (2.5, -CHAMFER_3_SIZE), (2.5, 0), align=None)
    revolve(axis=Axis((-131.150275607, 39.020821594, -22.771416816), (-0.05997314036154614, -0.9976277272985652, -0.03379556421002566)), mode=Mode.SUBTRACT)
    with BuildSketch(Plane(origin=(-133.548619994, 39.528263626, -33.494776681), x_dir=(0.9981979311307727, -0.06000741859341225, 2.6318502932554267e-12), z_dir=(0.0020279845707771578, 0.03373466227568696, -0.9994287667661592))) as chamfer_3_piece_4:
        Polygon((2.5 + CHAMFER_3_SIZE, 0), (2.5, -CHAMFER_3_SIZE), (2.5, 0), align=None)
    revolve(axis=Axis((-133.548619994, 39.528263626, -33.494776681), (-0.05997314036154614, -0.9976277272985652, -0.03379556421002566)), mode=Mode.SUBTRACT)

    # 倒角4
    chamfer_4_edges = [part.edges().sort_by_distance(p)[0] for p in [
        (-132.33206836, 41.817622648, -29.260151714),
    ]]
    chamfer(chamfer_4_edges, length=CHAMFER_4_SIZE)


solid = part.part
